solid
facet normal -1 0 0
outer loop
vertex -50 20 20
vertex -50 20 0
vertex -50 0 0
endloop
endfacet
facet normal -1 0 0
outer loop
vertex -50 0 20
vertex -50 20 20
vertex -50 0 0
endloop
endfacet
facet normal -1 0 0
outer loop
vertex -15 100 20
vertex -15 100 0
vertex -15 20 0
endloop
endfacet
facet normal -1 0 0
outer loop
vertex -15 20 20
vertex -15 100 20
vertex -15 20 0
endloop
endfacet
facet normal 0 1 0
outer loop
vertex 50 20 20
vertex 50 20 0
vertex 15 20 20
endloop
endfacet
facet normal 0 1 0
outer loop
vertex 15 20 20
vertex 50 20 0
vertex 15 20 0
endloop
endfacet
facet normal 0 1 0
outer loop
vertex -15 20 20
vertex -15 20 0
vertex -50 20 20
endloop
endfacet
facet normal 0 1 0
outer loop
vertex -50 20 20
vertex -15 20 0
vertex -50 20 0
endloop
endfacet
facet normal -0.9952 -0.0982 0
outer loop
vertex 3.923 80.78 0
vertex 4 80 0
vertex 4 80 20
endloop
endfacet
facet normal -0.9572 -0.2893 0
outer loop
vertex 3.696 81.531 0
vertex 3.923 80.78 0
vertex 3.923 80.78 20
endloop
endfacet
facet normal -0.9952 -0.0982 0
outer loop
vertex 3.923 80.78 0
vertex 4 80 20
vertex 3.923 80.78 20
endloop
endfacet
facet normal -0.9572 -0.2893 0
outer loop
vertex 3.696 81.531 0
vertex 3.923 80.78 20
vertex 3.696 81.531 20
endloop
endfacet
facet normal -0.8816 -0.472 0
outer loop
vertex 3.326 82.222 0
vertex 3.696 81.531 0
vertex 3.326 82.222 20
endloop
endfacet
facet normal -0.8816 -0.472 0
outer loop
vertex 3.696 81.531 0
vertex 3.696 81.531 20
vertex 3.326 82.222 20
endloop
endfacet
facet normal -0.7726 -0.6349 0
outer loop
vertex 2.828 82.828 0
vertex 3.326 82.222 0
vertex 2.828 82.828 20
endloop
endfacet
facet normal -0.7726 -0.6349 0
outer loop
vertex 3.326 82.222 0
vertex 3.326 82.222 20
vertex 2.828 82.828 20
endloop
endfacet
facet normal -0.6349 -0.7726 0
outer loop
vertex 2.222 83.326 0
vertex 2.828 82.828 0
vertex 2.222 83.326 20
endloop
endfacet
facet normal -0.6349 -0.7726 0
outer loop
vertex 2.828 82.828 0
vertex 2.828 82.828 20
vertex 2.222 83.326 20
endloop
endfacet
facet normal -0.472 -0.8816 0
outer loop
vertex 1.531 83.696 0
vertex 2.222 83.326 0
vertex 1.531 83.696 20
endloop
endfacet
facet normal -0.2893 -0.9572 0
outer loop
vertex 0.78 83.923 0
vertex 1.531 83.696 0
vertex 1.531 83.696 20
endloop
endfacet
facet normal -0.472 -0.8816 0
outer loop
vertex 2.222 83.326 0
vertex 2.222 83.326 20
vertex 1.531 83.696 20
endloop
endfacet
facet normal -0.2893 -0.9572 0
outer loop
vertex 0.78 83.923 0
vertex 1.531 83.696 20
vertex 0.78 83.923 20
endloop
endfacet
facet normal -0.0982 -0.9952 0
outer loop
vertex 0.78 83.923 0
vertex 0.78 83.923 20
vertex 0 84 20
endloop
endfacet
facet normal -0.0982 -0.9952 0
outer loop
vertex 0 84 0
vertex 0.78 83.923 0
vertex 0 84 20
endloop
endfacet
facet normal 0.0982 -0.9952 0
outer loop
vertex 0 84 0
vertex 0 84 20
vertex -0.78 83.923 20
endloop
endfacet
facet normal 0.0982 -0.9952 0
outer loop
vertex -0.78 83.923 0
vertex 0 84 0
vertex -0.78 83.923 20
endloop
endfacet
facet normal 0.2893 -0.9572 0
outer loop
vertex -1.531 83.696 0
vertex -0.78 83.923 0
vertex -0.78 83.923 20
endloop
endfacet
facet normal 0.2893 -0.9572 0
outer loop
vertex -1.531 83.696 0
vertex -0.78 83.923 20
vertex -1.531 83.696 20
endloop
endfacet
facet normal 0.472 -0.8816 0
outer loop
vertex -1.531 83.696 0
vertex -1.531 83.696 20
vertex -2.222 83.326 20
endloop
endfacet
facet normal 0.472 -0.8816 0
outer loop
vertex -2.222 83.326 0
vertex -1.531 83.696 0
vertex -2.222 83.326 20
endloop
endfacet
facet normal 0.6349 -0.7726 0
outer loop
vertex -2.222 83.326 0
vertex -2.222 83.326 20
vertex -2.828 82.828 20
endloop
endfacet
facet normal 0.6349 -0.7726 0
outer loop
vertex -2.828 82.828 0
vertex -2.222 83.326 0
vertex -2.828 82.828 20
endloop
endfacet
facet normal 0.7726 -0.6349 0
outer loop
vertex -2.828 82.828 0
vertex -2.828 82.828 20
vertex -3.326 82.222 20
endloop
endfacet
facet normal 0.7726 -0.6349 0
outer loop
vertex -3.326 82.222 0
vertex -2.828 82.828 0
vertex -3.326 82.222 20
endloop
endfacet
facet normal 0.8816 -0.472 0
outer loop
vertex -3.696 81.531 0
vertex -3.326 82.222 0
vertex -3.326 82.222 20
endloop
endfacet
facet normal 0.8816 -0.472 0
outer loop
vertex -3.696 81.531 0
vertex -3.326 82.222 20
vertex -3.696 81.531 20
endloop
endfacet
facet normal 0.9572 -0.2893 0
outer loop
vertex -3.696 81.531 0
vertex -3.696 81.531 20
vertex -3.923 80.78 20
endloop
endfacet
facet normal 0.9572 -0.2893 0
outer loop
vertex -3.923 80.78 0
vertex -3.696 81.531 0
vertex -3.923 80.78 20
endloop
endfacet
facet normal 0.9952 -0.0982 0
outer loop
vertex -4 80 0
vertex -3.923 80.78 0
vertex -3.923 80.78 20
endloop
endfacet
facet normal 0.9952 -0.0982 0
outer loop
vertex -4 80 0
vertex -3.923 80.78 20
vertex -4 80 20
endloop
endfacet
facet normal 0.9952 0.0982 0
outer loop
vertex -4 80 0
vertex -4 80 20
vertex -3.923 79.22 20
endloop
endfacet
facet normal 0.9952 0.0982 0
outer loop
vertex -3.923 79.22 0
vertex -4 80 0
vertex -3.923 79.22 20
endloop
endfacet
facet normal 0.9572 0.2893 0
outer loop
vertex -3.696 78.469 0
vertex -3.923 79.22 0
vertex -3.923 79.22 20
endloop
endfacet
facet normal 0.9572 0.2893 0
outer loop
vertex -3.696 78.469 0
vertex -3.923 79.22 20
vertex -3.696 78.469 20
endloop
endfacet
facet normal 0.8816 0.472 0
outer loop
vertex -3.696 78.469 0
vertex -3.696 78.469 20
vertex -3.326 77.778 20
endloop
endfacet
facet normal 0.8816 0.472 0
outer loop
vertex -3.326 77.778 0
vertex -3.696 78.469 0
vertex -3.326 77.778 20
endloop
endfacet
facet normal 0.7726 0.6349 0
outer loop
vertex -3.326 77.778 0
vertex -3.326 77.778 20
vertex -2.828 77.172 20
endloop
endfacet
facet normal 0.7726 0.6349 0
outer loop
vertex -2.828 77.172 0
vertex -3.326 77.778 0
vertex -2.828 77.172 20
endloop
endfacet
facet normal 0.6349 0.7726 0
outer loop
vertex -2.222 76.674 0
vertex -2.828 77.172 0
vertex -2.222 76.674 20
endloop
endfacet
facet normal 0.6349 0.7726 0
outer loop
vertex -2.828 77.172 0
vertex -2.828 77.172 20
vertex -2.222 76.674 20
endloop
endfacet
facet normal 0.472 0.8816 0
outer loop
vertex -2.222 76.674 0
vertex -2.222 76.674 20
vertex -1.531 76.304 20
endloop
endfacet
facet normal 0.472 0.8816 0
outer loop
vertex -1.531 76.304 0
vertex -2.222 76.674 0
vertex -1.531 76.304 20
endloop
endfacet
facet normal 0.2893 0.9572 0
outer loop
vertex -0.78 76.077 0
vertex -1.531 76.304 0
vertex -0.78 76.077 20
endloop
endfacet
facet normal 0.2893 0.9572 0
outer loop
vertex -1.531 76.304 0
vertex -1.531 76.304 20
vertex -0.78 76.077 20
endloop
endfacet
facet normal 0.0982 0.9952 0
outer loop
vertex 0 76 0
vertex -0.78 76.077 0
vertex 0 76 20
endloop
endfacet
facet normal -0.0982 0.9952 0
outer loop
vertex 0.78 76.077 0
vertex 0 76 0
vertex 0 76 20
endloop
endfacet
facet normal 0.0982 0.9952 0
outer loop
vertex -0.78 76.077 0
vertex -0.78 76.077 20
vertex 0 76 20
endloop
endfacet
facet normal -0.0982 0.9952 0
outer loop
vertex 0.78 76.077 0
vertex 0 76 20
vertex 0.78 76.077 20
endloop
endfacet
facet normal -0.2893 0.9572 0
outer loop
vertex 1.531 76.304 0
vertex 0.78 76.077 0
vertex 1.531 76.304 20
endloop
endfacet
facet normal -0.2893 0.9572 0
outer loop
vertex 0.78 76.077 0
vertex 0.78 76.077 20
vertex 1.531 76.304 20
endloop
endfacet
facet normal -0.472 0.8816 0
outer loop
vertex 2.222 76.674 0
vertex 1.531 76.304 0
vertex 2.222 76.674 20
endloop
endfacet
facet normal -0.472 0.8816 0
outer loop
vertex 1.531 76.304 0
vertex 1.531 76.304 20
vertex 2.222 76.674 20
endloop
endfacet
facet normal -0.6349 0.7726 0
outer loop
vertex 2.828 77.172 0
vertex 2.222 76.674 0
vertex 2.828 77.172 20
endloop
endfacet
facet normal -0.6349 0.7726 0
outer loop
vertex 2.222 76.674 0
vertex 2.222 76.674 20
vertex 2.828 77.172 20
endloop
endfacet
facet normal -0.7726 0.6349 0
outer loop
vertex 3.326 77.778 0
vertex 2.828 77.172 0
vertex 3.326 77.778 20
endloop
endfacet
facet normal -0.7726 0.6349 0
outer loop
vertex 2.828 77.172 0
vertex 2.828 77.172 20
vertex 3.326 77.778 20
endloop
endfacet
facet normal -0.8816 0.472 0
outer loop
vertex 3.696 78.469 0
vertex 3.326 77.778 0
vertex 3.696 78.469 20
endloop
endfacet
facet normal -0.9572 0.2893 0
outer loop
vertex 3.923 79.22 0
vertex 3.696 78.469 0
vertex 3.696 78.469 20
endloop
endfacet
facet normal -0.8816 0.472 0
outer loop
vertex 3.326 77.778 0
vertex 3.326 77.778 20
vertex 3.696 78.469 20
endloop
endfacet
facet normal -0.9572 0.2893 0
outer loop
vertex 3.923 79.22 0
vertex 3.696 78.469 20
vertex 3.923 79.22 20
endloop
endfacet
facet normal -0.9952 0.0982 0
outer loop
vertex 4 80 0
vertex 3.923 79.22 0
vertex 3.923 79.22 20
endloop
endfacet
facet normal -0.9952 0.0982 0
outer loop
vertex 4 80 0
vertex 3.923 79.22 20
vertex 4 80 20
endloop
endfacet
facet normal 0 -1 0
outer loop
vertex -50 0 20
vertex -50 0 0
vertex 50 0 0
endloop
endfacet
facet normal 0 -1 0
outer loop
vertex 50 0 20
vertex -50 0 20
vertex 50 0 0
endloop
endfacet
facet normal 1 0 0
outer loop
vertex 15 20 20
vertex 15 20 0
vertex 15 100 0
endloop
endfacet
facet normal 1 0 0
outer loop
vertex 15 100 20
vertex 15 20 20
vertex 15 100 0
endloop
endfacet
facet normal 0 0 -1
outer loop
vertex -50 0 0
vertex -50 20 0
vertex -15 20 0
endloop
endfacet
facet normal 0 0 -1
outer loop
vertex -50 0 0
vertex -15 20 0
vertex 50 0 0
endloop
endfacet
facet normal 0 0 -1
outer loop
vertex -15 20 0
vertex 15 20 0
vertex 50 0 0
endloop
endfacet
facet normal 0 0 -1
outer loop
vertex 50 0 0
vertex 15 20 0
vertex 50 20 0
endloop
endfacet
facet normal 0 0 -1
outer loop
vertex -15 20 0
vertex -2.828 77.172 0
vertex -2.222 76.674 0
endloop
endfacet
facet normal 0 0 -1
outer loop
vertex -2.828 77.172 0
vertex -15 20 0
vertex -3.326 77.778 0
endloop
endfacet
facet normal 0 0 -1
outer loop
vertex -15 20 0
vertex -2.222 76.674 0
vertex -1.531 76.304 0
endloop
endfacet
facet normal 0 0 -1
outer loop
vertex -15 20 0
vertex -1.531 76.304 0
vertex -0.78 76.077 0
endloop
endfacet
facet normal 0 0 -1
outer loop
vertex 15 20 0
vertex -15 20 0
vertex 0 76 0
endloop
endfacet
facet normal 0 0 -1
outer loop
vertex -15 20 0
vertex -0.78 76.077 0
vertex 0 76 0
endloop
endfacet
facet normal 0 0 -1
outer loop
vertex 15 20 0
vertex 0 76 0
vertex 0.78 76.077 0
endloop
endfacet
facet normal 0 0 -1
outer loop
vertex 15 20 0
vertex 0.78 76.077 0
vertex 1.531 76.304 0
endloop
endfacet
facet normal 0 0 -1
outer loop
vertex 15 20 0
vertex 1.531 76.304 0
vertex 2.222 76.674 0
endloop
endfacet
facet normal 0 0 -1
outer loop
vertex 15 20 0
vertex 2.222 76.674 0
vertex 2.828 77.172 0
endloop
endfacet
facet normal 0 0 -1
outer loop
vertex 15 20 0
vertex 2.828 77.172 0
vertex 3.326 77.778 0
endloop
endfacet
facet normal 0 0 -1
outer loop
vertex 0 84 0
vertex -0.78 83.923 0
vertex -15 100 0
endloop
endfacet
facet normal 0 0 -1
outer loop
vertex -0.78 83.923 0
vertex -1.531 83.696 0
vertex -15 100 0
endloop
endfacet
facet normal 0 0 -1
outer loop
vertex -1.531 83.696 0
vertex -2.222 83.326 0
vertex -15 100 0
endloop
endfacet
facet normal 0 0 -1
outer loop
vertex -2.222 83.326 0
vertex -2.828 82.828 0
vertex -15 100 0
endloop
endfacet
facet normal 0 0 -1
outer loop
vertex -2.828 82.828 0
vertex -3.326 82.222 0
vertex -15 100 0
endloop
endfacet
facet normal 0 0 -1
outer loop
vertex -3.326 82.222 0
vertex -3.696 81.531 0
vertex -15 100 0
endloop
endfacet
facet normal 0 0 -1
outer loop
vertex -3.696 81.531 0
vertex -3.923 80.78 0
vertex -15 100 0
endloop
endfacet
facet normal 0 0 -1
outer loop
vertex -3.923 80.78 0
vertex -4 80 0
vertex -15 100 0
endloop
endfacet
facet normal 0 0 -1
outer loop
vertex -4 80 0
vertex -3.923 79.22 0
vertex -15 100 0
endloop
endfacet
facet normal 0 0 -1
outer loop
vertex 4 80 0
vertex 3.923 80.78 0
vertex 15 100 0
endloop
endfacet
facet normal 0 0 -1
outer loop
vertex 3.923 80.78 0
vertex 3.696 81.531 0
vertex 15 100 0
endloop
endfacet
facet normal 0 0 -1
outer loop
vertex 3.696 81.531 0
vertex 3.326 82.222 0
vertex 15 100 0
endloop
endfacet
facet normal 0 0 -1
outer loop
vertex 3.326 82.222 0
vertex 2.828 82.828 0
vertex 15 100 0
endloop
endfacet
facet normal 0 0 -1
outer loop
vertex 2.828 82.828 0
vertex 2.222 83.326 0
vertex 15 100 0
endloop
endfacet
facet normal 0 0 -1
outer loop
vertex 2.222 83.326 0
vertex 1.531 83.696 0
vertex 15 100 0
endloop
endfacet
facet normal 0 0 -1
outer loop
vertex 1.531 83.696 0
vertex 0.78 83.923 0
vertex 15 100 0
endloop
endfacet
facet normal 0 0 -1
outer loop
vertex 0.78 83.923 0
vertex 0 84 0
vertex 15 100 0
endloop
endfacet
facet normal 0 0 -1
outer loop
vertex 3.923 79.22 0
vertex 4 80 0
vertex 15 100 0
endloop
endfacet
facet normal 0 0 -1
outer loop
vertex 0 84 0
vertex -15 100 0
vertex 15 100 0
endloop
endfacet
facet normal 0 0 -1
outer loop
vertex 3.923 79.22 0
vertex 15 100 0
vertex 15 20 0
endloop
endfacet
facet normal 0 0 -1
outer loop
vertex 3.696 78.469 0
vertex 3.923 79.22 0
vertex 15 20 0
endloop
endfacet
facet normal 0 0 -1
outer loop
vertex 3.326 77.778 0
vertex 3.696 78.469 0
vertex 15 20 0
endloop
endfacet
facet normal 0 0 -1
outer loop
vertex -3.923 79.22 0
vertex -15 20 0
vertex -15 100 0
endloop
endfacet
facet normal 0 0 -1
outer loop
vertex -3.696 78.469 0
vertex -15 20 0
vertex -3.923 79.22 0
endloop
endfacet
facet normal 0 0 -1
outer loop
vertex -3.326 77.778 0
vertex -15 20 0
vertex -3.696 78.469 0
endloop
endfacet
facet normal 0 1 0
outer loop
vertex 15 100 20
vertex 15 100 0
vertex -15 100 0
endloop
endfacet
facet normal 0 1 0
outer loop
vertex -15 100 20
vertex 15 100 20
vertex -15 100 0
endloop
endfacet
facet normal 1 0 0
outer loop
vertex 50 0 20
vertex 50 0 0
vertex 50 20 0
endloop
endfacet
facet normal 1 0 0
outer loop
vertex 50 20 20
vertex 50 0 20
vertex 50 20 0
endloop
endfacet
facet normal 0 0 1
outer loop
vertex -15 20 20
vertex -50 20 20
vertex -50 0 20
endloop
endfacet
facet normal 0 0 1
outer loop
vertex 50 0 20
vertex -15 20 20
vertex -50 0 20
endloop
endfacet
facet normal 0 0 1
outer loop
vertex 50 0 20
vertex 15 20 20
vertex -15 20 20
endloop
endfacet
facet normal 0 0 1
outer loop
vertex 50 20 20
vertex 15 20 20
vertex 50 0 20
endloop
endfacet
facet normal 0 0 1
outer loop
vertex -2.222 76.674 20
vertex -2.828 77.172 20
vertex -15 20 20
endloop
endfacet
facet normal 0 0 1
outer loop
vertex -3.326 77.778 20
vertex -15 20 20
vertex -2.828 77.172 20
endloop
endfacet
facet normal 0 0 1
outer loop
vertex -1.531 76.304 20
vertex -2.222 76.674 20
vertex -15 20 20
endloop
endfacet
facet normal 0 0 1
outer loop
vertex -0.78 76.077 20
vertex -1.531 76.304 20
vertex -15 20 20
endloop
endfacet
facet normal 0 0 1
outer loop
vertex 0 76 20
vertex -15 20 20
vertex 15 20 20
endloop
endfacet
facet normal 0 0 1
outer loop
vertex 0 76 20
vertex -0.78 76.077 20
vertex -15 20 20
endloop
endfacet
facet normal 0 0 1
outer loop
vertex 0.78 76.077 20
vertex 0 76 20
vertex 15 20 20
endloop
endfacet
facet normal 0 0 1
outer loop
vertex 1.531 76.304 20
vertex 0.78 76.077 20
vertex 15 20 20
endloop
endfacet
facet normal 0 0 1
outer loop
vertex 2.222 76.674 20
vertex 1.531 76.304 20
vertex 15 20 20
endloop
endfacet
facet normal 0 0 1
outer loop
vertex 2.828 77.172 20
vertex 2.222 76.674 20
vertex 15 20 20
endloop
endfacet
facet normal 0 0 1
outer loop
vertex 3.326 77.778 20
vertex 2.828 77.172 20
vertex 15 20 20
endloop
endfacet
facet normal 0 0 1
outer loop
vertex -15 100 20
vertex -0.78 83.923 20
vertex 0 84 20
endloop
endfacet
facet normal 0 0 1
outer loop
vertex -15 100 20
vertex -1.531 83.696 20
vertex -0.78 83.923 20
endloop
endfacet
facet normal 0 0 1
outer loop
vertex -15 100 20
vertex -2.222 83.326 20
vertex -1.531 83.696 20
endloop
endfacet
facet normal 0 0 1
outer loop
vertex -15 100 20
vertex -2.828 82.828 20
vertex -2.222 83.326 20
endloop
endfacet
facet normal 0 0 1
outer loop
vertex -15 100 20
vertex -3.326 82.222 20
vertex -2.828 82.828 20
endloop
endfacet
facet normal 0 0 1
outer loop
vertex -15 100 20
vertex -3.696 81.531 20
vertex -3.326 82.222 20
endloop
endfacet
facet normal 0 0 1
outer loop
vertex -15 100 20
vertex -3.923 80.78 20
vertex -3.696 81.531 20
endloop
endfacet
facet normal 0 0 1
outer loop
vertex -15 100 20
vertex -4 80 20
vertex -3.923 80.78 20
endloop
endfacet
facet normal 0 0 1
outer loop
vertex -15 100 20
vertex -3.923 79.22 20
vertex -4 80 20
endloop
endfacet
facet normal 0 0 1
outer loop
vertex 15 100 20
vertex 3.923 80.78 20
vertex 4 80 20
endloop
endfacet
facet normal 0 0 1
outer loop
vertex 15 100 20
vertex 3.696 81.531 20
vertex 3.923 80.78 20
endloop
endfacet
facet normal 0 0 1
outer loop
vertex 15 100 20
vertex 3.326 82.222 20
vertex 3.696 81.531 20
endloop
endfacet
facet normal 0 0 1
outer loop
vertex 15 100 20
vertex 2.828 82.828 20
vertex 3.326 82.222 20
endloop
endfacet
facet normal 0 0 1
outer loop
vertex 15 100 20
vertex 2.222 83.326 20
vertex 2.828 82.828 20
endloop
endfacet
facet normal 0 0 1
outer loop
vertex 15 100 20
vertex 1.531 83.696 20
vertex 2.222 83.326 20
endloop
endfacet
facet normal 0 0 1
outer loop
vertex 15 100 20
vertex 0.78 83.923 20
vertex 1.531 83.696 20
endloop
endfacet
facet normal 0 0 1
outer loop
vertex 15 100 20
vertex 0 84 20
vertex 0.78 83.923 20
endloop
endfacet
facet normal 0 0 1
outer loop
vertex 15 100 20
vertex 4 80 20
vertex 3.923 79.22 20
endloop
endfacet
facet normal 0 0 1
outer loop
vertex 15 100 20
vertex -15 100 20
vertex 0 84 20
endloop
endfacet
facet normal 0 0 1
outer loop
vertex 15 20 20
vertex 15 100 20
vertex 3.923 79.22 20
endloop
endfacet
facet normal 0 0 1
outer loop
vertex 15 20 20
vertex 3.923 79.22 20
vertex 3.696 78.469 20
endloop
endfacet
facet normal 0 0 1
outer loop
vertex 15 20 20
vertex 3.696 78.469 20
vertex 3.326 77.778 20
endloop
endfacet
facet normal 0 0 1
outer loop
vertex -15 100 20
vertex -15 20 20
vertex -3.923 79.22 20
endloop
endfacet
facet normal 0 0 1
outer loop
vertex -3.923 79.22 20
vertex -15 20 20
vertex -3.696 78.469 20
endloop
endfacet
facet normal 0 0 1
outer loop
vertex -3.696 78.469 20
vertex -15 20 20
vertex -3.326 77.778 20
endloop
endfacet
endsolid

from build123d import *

# Parameters (mm, degrees)
F1_DEPTH = 20
F2_R     = 4
F3_DEPTH = 20.001


with BuildPart() as f1:
    # F0 (on Top) → F1 (new body)
    with BuildSketch(Plane.XY):
        Polygon((-50, 0), (0, 0), (50, 0), (50, 20), (15, 20), (15, 100), (0, 100), (-15, 100), (-15, 20), (-50, 20), align=None)
    extrude(amount=F1_DEPTH)

    # F2 (on face) → F3 (cut, through all)
    with BuildSketch(Plane.XY.offset(20)):
        with Locations((0, 80)):
            Circle(F2_R)
    extrude(amount=-F3_DEPTH, mode=Mode.SUBTRACT)


solid = f1.part
